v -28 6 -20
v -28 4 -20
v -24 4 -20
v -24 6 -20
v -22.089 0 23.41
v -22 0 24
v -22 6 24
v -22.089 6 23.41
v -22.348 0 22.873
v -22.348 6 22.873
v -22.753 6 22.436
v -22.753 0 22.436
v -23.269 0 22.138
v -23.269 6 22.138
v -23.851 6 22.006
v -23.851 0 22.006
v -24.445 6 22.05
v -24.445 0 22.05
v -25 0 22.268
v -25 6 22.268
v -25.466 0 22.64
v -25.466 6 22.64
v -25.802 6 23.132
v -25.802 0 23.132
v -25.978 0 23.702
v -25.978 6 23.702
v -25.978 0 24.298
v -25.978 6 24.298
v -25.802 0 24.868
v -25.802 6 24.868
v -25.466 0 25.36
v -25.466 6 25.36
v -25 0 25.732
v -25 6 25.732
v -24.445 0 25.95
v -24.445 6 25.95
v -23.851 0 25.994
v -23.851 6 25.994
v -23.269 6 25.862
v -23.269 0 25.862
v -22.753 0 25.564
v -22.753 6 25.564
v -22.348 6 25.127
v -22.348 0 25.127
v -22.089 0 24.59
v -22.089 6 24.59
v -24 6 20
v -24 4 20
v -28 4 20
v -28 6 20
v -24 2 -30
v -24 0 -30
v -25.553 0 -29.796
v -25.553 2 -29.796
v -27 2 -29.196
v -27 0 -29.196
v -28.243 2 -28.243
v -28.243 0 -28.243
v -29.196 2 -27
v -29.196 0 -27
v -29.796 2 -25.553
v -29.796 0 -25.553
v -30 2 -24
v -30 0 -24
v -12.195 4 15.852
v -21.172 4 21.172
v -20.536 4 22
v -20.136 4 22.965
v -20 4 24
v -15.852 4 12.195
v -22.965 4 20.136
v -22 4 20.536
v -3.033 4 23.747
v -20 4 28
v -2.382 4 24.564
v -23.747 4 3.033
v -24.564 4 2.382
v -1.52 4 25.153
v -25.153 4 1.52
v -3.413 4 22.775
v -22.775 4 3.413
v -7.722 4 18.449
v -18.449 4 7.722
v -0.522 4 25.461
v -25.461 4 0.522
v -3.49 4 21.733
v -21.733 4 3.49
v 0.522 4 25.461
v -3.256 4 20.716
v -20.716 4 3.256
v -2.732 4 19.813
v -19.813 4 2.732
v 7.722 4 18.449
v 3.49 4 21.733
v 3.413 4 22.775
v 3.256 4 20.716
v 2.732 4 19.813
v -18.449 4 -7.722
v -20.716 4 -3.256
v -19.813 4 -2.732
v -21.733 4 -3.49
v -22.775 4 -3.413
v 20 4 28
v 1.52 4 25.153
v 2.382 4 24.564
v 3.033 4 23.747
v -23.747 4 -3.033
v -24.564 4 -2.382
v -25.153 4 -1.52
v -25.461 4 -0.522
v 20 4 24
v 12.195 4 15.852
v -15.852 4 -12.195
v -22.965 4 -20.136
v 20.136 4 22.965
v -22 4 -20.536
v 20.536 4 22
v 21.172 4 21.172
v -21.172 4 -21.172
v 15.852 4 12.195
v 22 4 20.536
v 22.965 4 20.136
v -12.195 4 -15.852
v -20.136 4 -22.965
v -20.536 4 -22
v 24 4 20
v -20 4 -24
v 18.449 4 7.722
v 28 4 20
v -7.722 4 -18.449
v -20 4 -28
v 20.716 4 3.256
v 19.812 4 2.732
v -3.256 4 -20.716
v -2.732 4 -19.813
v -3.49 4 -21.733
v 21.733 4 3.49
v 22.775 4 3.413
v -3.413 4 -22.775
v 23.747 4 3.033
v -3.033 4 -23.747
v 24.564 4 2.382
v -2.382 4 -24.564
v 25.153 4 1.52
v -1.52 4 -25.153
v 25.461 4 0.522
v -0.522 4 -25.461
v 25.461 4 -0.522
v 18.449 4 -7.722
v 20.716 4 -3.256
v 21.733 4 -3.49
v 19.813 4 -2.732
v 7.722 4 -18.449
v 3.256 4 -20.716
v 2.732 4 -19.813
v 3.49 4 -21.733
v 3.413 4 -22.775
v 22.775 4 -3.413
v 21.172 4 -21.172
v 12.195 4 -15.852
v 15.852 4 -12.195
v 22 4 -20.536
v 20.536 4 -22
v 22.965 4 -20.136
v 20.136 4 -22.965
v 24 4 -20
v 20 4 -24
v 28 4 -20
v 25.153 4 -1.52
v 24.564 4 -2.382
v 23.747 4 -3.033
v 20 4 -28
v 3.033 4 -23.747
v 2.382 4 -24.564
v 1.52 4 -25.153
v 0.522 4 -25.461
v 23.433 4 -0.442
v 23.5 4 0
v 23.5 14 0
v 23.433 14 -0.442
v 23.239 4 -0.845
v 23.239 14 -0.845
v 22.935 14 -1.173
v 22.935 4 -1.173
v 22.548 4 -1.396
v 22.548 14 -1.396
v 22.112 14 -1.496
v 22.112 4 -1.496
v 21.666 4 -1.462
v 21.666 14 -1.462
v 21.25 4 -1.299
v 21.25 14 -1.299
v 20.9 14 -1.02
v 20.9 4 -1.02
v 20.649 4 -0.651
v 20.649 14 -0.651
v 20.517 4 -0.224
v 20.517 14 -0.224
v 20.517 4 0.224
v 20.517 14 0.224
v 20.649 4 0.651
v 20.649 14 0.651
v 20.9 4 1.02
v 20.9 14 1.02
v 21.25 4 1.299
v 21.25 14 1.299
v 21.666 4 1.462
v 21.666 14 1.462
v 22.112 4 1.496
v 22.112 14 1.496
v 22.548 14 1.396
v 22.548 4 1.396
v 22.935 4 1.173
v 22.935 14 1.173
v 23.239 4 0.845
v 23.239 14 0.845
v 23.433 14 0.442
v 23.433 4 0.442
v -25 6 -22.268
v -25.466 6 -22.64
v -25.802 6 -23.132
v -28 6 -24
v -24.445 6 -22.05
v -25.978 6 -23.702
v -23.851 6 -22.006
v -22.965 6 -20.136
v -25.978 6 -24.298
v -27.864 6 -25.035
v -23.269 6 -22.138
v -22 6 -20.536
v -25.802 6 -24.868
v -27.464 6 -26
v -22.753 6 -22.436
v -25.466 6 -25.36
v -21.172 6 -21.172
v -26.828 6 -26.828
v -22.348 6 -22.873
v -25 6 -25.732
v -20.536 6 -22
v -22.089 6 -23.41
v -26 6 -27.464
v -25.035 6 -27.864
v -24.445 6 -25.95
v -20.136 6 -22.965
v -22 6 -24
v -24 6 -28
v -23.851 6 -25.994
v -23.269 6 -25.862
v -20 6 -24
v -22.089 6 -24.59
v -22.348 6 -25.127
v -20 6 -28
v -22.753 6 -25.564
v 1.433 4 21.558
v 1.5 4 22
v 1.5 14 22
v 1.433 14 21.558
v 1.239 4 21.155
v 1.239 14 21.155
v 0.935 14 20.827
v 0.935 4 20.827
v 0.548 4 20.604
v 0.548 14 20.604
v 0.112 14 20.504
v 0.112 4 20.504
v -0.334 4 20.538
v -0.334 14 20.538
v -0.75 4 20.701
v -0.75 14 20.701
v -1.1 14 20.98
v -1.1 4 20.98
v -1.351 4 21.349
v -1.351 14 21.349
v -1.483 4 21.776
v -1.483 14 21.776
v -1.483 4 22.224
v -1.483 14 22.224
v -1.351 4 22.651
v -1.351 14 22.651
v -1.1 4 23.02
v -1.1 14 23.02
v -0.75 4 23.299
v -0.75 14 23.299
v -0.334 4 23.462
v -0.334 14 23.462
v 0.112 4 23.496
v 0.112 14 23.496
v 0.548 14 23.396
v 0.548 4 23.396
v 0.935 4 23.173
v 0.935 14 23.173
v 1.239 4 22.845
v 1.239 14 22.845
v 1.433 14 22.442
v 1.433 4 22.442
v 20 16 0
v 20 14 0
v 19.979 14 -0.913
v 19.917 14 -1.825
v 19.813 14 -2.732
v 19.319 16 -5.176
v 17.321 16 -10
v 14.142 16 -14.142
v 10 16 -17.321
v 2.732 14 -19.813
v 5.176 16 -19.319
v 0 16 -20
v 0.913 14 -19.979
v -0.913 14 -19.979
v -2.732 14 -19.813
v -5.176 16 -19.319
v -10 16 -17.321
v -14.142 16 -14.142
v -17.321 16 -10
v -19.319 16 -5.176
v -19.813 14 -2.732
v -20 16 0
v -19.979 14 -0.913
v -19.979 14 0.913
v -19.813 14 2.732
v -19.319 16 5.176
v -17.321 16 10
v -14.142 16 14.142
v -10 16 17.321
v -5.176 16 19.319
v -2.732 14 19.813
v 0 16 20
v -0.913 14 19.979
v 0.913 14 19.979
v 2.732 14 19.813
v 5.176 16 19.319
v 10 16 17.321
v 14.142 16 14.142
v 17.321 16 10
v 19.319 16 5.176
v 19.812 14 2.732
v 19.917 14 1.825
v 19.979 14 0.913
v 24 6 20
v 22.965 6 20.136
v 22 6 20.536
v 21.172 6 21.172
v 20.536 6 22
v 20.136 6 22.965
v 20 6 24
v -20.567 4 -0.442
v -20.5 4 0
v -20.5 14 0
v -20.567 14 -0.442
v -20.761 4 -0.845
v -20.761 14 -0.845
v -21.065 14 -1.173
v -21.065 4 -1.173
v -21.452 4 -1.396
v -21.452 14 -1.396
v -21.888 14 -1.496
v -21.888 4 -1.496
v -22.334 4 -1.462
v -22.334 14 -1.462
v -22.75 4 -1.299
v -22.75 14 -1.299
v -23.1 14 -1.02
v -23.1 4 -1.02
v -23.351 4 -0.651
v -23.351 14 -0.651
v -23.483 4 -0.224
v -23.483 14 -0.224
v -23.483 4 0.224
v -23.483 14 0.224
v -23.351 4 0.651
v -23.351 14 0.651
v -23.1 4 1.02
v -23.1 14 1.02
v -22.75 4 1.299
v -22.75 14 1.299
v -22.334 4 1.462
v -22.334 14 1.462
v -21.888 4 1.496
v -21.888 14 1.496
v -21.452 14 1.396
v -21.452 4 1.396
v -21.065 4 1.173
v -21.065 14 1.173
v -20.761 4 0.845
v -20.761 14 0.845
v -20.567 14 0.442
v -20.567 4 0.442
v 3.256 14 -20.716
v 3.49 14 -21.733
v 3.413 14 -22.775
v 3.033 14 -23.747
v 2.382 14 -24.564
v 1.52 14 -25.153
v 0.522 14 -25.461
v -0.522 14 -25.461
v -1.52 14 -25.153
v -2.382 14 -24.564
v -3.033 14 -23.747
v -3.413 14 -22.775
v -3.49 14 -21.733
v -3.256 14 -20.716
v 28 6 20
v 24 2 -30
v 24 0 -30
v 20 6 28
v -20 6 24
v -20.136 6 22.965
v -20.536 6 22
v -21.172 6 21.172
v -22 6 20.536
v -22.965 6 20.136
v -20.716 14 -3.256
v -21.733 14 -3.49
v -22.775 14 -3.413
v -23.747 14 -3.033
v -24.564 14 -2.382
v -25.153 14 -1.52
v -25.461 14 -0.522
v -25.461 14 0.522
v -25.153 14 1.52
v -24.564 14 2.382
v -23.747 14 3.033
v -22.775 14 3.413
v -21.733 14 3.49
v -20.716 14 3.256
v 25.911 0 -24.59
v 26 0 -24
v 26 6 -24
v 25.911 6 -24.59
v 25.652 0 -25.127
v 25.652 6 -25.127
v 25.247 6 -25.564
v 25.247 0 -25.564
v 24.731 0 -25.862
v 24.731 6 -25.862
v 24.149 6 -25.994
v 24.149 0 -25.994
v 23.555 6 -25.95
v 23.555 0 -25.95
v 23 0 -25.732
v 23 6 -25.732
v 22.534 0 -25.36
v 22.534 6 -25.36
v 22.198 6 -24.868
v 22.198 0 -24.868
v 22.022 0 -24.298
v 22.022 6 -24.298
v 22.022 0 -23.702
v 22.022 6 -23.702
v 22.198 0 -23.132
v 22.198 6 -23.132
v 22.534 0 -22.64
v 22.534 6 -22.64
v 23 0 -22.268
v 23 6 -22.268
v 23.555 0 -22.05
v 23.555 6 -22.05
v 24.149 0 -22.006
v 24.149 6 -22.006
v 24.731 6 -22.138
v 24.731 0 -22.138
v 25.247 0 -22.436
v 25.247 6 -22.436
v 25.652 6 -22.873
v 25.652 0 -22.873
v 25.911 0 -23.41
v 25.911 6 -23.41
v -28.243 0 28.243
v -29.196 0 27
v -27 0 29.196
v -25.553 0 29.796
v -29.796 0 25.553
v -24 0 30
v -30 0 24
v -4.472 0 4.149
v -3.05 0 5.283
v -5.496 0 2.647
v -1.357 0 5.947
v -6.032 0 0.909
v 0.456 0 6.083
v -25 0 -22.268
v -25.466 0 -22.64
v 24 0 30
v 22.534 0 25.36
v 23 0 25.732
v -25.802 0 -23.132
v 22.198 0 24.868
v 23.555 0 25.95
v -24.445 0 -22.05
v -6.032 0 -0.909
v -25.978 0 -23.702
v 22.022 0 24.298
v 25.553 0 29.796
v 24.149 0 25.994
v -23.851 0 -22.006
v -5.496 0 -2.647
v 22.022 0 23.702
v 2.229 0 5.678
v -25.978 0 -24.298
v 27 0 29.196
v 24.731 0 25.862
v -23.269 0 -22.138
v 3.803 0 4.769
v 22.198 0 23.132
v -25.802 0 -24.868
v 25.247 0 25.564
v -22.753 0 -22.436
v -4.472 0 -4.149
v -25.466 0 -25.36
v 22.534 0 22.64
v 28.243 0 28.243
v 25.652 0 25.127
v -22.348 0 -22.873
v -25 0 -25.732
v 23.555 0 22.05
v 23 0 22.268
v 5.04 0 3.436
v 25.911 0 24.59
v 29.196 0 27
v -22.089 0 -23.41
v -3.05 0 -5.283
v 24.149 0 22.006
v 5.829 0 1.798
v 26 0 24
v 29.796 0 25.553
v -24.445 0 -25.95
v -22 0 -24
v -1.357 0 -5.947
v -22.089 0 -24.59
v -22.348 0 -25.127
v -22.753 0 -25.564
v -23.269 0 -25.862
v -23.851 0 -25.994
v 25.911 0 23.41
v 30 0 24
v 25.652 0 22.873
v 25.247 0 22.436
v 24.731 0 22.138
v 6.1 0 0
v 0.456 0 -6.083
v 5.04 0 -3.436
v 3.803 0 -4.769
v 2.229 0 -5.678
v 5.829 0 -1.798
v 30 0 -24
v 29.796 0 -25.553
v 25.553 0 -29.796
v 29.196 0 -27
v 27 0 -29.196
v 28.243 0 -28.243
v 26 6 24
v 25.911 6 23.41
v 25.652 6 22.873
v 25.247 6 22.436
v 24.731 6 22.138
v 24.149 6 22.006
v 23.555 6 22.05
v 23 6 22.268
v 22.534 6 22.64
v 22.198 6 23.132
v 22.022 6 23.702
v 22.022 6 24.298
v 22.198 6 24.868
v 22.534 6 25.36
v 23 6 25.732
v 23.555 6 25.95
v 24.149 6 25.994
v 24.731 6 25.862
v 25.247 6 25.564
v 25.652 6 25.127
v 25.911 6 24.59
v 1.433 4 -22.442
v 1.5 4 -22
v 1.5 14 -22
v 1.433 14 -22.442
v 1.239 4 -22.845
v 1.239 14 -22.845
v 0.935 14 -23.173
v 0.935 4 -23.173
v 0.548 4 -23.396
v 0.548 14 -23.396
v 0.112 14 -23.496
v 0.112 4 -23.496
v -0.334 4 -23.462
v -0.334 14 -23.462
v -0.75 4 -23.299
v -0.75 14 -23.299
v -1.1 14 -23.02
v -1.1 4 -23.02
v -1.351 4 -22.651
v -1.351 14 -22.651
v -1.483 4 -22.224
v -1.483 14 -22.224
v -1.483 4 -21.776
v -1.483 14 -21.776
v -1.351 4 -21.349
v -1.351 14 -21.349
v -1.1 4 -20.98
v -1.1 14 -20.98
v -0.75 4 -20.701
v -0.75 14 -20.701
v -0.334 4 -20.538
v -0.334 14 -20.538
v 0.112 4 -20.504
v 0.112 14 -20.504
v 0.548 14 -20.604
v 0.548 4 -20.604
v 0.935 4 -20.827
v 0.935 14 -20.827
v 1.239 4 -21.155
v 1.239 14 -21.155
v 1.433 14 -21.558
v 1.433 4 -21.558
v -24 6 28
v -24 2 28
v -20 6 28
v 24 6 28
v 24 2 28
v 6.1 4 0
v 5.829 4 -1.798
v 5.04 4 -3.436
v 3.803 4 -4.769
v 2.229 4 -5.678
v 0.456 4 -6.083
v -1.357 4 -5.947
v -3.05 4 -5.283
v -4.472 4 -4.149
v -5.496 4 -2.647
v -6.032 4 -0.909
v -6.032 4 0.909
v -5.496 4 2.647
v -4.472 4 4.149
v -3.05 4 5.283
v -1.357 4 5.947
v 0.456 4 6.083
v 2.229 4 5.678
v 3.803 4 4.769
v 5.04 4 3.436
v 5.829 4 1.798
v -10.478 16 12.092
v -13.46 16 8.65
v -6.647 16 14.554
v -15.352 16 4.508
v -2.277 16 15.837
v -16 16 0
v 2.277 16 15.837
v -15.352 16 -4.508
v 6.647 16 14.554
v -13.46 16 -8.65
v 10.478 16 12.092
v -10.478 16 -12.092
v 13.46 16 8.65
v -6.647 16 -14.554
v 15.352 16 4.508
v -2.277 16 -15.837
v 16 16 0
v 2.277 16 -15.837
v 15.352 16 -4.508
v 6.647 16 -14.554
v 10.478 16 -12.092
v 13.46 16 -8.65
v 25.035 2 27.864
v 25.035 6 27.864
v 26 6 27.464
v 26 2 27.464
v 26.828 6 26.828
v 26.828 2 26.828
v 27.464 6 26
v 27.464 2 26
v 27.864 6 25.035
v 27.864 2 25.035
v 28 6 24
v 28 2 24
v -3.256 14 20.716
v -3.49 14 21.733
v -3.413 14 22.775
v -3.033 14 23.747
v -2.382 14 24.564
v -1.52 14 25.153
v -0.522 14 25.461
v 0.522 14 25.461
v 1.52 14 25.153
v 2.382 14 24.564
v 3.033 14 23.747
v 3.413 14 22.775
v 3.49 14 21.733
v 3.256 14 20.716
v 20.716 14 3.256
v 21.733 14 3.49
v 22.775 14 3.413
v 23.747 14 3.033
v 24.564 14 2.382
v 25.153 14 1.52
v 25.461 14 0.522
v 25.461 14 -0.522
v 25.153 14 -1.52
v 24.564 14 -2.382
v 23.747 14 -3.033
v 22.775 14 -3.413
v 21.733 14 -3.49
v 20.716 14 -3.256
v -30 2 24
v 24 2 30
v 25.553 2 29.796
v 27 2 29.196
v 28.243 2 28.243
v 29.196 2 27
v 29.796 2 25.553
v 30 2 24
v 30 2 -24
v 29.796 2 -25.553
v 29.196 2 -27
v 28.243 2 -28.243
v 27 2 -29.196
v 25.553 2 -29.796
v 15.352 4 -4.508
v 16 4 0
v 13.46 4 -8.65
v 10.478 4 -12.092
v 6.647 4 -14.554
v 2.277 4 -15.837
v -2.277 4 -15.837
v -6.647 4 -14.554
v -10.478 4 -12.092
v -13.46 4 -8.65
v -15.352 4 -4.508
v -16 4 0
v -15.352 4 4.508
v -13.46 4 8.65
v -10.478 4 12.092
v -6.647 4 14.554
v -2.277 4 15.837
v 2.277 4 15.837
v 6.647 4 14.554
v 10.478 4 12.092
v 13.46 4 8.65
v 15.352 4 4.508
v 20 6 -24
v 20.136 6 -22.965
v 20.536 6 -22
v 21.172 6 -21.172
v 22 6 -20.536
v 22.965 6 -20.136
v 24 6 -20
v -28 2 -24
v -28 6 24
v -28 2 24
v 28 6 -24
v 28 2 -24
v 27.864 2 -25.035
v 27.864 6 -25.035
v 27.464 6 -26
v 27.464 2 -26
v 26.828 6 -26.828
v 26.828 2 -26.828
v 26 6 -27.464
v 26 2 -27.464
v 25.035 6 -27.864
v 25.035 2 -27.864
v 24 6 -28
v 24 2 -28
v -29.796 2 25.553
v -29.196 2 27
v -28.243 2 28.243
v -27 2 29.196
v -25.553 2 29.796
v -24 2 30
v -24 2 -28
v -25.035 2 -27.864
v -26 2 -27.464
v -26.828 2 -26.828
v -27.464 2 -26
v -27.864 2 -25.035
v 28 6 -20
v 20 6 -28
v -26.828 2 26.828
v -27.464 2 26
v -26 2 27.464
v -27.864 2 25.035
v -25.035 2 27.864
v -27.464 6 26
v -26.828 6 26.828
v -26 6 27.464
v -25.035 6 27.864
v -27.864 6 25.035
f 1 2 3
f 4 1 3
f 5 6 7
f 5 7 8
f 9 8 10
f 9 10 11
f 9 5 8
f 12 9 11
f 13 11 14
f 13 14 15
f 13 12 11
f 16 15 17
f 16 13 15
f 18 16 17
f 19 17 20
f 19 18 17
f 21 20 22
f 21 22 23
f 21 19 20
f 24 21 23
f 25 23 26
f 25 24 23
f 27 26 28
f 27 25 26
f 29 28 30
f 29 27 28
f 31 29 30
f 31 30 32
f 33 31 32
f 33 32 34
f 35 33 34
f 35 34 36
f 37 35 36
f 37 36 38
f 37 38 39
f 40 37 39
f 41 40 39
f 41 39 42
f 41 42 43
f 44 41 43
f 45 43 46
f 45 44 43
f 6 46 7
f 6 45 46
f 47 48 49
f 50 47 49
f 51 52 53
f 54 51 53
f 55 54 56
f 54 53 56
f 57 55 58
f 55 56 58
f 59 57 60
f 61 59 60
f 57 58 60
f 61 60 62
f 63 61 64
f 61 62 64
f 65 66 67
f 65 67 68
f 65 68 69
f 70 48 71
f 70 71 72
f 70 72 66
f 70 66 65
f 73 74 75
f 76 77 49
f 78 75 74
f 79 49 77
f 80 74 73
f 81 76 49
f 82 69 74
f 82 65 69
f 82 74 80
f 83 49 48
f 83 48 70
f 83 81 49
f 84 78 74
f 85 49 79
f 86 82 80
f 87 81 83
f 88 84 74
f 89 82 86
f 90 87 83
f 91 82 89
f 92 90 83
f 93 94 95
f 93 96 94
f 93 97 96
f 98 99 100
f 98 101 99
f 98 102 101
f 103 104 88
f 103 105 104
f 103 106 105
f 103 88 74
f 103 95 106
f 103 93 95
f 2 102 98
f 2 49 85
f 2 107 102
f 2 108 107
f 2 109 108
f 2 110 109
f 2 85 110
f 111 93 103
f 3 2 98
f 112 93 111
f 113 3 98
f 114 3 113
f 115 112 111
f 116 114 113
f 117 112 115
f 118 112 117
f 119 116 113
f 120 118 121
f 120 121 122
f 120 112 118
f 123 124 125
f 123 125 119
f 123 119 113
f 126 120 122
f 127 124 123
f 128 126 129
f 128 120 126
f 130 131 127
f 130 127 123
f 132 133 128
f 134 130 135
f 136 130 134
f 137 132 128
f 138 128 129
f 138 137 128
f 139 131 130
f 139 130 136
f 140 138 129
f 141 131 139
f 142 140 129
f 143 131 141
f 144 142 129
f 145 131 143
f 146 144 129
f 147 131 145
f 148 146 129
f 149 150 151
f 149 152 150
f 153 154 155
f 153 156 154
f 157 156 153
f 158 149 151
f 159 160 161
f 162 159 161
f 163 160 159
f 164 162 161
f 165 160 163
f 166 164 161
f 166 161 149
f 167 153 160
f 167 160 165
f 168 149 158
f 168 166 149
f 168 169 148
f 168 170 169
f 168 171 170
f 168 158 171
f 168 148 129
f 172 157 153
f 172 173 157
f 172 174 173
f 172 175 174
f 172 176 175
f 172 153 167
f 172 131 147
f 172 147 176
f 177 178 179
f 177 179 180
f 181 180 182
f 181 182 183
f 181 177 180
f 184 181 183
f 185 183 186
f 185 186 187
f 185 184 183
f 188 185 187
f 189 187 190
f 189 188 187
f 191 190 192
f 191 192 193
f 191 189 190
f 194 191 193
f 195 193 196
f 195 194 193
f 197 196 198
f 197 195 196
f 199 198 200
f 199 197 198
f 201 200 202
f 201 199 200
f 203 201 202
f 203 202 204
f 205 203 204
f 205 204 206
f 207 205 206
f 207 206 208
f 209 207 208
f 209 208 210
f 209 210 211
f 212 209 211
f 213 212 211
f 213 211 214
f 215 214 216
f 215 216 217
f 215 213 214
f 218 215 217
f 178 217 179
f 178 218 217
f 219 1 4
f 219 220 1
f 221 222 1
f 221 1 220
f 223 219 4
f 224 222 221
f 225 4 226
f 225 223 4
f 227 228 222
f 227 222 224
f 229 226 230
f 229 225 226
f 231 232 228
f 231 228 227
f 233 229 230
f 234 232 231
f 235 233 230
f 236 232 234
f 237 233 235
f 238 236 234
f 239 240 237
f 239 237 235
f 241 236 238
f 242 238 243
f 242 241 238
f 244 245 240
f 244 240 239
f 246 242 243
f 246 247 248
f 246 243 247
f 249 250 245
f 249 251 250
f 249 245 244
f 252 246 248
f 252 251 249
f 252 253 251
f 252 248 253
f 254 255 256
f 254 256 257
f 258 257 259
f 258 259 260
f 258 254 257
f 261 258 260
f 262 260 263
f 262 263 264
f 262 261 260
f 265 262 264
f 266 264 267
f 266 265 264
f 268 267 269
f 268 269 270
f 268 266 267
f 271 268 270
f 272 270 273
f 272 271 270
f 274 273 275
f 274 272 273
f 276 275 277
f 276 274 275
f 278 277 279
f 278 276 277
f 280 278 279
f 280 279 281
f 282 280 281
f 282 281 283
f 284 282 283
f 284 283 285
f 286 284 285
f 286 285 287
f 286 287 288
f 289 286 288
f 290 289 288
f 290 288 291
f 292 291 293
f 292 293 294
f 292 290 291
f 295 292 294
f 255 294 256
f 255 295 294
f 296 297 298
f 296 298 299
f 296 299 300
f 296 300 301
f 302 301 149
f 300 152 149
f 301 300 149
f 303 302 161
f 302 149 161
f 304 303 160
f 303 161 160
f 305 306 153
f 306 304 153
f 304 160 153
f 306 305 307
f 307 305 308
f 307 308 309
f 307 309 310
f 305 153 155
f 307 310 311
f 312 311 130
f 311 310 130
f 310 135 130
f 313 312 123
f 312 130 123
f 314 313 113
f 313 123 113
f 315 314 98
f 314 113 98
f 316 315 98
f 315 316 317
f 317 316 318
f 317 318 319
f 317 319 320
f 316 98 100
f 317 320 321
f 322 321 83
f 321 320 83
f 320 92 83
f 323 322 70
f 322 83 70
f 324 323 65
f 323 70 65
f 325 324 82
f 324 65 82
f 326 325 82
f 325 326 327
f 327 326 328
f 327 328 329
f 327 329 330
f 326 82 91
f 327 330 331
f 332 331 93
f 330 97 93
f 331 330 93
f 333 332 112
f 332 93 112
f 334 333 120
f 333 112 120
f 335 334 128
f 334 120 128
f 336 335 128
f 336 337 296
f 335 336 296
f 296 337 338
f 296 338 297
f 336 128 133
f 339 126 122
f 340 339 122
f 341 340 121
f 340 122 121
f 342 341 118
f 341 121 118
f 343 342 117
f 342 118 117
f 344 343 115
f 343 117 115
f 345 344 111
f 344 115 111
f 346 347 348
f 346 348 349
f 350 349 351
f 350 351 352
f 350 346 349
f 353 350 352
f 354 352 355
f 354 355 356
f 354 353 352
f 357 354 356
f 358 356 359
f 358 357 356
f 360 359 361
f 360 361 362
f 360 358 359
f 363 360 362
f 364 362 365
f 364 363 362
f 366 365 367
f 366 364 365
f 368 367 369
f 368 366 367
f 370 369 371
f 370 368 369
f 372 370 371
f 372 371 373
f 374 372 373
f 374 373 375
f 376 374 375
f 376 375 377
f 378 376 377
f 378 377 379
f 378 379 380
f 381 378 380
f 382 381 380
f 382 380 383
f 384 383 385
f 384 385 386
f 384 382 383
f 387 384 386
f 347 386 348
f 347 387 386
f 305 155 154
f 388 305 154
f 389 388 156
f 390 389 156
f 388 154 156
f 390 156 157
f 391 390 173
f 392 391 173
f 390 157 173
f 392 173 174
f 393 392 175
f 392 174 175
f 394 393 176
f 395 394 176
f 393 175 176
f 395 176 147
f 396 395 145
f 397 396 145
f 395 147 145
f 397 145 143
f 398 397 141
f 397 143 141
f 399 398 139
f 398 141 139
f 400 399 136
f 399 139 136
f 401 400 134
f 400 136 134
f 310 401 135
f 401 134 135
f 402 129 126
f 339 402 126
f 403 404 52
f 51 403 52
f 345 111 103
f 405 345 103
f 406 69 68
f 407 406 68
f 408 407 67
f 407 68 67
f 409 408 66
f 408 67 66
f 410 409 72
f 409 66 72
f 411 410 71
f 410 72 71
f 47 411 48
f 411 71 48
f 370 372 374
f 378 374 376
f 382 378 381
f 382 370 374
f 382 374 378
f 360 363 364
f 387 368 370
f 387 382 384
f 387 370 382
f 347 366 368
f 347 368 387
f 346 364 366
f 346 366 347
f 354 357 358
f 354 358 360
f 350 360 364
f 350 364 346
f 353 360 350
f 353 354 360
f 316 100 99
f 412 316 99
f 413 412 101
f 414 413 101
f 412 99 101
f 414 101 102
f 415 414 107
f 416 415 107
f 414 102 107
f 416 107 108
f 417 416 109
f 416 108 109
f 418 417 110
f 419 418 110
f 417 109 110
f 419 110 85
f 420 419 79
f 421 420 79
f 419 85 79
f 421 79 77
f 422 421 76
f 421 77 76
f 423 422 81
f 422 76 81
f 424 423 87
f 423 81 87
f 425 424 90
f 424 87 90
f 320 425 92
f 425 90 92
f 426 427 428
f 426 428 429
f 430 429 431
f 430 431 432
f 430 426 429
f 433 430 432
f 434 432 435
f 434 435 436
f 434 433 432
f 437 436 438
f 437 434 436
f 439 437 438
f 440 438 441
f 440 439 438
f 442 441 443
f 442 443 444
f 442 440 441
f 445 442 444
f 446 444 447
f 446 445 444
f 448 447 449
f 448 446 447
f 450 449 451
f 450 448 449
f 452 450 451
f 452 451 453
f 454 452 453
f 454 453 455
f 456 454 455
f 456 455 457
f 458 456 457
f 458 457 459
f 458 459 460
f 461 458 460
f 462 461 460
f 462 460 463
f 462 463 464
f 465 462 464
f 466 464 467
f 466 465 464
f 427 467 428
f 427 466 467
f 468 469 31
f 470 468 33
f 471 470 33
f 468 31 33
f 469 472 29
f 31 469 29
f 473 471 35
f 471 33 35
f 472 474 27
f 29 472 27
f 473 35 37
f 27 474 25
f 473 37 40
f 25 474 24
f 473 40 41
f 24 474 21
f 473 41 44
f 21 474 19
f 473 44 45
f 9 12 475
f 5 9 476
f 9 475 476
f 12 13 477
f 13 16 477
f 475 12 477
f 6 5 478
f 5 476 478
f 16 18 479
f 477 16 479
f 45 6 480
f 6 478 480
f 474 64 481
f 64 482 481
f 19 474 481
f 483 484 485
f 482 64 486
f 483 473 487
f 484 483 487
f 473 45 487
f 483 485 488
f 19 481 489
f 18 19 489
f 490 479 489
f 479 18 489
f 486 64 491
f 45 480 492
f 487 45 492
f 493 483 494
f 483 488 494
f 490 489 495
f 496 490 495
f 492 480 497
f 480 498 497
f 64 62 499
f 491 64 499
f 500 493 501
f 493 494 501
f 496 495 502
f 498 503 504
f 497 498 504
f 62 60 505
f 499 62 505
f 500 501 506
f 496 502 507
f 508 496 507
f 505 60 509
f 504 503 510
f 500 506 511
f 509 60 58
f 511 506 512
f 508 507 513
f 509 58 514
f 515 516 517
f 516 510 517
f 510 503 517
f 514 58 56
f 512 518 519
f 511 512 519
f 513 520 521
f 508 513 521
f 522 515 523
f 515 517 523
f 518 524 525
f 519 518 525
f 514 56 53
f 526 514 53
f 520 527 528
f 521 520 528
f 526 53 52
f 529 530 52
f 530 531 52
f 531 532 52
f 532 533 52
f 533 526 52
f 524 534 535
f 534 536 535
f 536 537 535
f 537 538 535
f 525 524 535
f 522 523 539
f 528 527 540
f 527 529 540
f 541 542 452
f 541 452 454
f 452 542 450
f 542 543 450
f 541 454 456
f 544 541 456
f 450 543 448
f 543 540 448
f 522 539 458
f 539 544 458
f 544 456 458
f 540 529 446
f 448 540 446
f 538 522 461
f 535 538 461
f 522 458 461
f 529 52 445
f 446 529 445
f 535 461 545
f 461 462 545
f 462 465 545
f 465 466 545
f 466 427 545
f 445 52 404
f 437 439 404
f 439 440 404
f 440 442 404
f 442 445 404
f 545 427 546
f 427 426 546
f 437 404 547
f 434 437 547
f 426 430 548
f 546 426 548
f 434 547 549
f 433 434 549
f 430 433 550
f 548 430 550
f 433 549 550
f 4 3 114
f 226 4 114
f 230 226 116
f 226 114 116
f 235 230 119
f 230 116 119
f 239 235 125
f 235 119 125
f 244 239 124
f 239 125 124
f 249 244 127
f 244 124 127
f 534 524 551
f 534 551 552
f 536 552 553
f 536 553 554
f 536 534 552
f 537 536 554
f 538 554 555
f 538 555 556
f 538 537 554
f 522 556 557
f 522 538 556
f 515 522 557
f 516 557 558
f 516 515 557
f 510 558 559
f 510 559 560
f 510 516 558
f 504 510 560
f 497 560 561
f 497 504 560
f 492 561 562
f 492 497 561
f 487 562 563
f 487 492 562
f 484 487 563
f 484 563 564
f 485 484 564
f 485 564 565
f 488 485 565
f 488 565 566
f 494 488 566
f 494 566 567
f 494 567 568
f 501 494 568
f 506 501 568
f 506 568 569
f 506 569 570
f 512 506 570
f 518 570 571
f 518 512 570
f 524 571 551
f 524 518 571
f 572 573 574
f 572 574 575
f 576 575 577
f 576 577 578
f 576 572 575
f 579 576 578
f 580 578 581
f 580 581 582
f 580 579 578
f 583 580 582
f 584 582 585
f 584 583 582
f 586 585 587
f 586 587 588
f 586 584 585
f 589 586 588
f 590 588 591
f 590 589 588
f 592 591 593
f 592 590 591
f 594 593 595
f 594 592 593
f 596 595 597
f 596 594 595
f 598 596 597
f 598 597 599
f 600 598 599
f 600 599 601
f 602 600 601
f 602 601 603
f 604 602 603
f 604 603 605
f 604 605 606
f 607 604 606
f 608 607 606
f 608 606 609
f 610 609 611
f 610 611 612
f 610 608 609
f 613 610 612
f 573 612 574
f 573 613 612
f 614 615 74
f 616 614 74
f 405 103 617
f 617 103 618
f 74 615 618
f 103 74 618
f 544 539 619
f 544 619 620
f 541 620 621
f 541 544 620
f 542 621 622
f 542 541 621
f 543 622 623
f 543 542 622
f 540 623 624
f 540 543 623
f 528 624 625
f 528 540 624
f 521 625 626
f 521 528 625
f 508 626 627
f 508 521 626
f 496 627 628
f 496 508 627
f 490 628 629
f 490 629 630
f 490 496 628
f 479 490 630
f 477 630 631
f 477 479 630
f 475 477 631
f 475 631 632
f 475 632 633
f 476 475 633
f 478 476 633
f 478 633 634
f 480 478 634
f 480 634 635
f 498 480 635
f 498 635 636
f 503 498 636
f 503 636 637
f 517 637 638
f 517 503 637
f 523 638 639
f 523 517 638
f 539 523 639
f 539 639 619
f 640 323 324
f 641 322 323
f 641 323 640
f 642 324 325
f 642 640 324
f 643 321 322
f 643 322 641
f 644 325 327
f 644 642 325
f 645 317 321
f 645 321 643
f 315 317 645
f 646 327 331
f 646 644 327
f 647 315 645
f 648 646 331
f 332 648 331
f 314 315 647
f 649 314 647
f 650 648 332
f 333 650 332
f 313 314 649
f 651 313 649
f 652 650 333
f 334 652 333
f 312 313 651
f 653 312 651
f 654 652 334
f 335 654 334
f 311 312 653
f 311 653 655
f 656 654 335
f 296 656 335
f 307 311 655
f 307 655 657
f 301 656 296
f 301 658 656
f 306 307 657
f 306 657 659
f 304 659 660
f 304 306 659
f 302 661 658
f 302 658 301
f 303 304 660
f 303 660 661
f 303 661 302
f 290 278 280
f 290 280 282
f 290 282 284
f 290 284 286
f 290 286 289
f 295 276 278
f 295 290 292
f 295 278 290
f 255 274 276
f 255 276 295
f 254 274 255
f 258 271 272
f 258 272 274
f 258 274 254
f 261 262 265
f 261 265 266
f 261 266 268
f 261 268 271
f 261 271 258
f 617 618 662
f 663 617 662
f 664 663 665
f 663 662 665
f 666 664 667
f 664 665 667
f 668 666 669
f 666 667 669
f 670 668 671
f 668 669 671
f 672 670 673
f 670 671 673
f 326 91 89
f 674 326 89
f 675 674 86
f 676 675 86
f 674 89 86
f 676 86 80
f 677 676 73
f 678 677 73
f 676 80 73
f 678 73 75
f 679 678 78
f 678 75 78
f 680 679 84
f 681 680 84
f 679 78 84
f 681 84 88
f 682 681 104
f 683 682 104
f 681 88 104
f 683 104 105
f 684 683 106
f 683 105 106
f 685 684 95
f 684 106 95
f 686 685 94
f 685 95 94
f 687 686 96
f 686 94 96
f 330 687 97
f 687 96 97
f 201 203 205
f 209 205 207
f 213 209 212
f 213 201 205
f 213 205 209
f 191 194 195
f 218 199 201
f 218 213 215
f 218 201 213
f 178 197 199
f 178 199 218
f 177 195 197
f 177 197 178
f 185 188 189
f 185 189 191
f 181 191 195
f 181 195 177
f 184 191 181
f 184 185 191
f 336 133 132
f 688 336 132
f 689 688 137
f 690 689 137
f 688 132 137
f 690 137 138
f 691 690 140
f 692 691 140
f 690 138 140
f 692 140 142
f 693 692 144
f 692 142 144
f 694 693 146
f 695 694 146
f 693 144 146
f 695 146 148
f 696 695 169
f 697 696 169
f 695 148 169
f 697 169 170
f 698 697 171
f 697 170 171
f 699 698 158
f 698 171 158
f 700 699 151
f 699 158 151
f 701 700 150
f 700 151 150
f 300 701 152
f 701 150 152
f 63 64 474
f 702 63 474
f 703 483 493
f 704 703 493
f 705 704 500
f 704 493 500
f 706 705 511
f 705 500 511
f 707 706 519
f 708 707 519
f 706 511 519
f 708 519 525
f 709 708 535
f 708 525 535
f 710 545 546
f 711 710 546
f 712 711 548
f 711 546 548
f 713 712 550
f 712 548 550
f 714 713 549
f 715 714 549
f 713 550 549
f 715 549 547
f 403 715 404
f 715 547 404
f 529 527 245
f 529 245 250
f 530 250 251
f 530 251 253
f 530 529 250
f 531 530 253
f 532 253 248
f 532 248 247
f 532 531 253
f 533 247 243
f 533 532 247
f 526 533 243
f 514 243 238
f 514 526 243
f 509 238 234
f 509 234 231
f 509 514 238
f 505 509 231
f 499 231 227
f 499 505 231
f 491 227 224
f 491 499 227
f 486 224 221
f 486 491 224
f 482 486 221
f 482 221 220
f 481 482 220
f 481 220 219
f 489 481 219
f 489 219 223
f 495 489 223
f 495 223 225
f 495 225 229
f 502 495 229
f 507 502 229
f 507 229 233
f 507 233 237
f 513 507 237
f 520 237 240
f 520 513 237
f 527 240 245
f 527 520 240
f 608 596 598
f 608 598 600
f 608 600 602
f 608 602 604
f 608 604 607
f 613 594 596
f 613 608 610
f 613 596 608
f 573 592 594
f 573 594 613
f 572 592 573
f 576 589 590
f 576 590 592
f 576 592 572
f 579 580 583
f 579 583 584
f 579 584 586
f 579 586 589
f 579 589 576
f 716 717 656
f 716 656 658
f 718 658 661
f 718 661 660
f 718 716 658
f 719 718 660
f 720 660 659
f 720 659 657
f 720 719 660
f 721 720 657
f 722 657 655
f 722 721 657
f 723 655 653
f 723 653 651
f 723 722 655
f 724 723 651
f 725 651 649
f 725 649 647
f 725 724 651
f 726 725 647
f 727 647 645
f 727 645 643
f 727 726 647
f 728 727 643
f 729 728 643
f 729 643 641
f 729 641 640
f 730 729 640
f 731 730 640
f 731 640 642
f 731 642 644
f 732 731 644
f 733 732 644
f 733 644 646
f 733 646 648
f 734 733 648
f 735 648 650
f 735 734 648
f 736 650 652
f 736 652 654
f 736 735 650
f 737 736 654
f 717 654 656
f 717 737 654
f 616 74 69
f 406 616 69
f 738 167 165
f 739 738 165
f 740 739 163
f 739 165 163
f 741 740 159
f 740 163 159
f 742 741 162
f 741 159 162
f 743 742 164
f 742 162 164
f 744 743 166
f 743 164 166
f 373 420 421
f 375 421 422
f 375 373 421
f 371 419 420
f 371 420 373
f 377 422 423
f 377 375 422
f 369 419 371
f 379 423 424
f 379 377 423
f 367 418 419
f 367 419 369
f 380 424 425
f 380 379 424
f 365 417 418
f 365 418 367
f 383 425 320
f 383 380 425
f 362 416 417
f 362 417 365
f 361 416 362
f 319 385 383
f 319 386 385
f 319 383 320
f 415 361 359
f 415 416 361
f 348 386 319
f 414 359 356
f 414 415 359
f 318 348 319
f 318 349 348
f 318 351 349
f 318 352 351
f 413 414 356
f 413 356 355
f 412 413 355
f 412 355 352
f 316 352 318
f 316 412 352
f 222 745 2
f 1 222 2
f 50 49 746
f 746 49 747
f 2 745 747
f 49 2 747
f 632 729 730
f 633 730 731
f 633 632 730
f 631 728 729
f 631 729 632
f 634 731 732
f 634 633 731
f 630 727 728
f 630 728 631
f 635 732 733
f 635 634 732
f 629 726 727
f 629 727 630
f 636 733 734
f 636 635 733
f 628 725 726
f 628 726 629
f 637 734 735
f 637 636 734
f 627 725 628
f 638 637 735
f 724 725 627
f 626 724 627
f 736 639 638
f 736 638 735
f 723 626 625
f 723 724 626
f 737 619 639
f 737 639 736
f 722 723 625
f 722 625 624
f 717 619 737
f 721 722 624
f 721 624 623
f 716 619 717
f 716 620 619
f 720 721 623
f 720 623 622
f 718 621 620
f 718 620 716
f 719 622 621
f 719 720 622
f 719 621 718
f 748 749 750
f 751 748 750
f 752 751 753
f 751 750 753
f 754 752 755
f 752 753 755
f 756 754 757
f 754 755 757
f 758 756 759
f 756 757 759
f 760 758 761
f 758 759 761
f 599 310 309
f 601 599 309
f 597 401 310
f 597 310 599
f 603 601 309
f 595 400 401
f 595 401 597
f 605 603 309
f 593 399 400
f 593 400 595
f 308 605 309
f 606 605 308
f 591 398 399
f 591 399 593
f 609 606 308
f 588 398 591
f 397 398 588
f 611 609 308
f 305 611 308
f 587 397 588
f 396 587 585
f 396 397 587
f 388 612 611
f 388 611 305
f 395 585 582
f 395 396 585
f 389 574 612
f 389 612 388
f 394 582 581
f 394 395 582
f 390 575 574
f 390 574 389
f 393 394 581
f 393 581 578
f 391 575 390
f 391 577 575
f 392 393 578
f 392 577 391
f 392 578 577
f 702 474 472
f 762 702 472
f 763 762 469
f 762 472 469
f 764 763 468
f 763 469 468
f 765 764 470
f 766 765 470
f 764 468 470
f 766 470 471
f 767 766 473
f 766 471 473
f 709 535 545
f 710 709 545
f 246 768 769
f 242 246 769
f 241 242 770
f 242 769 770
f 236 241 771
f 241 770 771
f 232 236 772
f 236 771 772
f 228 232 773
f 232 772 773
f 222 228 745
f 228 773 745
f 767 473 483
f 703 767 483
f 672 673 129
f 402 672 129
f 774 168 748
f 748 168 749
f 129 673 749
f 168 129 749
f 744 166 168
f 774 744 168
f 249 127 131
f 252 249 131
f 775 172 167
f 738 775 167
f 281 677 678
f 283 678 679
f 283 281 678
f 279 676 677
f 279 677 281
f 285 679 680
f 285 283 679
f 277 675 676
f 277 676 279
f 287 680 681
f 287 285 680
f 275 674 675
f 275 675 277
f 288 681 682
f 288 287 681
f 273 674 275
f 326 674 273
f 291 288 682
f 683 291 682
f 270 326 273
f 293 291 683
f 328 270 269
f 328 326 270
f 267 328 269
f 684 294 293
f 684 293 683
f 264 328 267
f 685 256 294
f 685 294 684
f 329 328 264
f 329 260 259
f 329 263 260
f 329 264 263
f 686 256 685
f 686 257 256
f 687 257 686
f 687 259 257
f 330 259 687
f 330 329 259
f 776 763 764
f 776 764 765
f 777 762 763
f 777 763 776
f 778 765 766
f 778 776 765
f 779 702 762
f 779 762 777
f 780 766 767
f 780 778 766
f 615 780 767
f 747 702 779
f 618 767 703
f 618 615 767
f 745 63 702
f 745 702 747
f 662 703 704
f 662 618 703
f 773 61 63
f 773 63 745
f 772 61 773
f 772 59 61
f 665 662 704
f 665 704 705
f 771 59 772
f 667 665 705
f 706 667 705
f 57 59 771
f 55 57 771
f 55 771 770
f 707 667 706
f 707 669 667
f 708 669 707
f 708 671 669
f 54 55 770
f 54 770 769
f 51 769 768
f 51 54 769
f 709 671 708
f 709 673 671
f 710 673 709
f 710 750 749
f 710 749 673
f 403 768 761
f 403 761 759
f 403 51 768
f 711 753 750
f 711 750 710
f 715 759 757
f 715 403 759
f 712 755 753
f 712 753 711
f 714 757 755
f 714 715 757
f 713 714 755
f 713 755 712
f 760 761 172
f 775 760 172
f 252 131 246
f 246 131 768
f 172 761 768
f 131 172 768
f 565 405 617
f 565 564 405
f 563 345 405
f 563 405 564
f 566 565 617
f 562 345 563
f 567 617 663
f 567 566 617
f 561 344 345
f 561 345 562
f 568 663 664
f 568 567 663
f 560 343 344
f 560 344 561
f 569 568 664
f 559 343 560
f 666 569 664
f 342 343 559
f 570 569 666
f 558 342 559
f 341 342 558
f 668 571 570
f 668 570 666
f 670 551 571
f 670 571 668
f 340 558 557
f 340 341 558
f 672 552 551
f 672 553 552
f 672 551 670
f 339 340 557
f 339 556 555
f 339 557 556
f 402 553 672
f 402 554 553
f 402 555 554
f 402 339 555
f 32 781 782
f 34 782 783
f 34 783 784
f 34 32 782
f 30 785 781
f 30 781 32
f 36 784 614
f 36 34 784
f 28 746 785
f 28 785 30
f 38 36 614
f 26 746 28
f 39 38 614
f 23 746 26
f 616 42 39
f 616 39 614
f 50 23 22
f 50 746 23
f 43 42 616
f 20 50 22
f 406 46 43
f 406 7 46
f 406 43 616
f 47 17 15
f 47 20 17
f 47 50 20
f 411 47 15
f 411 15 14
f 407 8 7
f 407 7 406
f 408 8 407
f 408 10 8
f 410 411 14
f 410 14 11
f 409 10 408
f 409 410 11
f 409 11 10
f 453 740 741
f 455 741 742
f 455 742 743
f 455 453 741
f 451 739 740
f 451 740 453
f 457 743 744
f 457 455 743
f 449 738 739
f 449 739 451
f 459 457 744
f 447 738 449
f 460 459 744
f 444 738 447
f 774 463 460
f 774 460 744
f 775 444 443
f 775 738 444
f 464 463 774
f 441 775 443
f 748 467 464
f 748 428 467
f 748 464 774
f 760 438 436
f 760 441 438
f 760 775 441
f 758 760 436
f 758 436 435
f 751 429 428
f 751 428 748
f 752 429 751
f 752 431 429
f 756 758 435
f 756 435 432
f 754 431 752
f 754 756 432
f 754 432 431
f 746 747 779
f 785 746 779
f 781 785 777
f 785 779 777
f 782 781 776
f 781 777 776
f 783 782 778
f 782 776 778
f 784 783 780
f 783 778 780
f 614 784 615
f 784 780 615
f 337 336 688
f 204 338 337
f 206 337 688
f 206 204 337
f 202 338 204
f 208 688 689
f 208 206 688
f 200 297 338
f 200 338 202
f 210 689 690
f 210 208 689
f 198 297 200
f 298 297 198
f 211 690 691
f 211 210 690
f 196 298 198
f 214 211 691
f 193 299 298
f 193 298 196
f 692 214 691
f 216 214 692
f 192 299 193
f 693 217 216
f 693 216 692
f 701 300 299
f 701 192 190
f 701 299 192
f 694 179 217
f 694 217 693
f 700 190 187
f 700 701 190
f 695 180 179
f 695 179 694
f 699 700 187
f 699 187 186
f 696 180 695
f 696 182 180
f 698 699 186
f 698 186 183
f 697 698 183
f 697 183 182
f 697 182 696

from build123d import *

# Parameters (mm, degrees)
SKETCH1_R           = 6.1
BOSS_EXTRUDE1_DEPTH = 4
BOSS_EXTRUDE2_START = 4
SKETCH1_3_R         = 20
SKETCH1_3_R_2       = 16
BOSS_EXTRUDE2_DEPTH = 12
BOSS_EXTRUDE3_DEPTH = 2
SKETCH1_5_R         = 2
BOSS_EXTRUDE4_DEPTH = 6
BOSS_EXTRUDE5_START = 4
SKETCH1_6_R         = 1.5
BOSS_EXTRUDE5_DEPTH = 10


with BuildPart() as part:
    # Sketch1 → Boss-Extrude1 (new body)
    with BuildSketch(Plane(origin=(0, 0, 0), x_dir=(1, 0, 0), z_dir=(0, 1, 0))):
        with BuildLine():
            Line((-24, 20), (-28, 20))
            Line((-28, 20), (-28, -20))
            Line((-28, -20), (-24, -20))
            ThreePointArc((-24, -20), (-21.171572875, -21.171572875), (-20, -24))
            Line((-20, -24), (-20, -28))
            Line((-20, -28), (20, -28))
            Line((20, -28), (20, -24))
            ThreePointArc((20, -24), (21.171572875, -21.171572875), (24, -20))
            Line((24, -20), (28, -20))
            Line((28, -20), (28, 20))
            Line((28, 20), (24, 20))
            ThreePointArc((24, 20), (21.171572875, 21.171572875), (20, 24))
            Line((20, 24), (20, 28))
            Line((20, 28), (-20, 28))
            Line((-20, 28), (-20, 24))
            ThreePointArc((-20, 24), (-21.171572875, 21.171572875), (-24, 20))
        make_face()
        Circle(SKETCH1_R, mode=Mode.SUBTRACT)
    extrude(amount=BOSS_EXTRUDE1_DEPTH)

    # Sketch1_3 → Boss-Extrude2 (add)
    with BuildSketch(Plane(origin=(0, 0, 0), x_dir=(1, 0, 0), z_dir=(0, 1, 0)).offset(BOSS_EXTRUDE2_START)):
        Circle(SKETCH1_3_R)
        Circle(SKETCH1_3_R_2, mode=Mode.SUBTRACT)
    extrude(amount=BOSS_EXTRUDE2_DEPTH)

    # Sketch1_4 → Boss-Extrude3 (add)
    with BuildSketch(Plane(origin=(0, 0, 0), x_dir=(1, 0, 0), z_dir=(0, 1, 0))):
        with BuildLine():
            Line((24, 30), (-24, 30))
            ThreePointArc((-24, 30), (-28.242640687, 28.242640687), (-30, 24))
            Line((-30, 24), (-30, -24))
            ThreePointArc((-30, -24), (-28.242640687, -28.242640687), (-24, -30))
            Line((-24, -30), (24, -30))
            ThreePointArc((24, -30), (28.242640687, -28.242640687), (30, -24))
            Line((30, -24), (30, 24))
            ThreePointArc((30, 24), (28.242640687, 28.242640687), (24, 30))
        make_face()
        with BuildLine():
            Line((-28, 20), (-28, 24))
            ThreePointArc((-28, 24), (-26.828427125, 26.828427125), (-24, 28))
            Line((-24, 28), (-20, 28))
            Line((-20, 28), (20, 28))
            Line((20, 28), (24, 28))
            ThreePointArc((24, 28), (26.828427125, 26.828427125), (28, 24))
            Line((28, 24), (28, 20))
            Line((28, 20), (28, -20))
            Line((28, -20), (28, -24))
            ThreePointArc((28, -24), (26.828427125, -26.828427125), (24, -28))
            Line((24, -28), (20, -28))
            Line((20, -28), (-20, -28))
            Line((-20, -28), (-24, -28))
            ThreePointArc((-24, -28), (-26.828427125, -26.828427125), (-28, -24))
            Line((-28, -24), (-28, -20))
            Line((-28, -20), (-28, 20))
        make_face(mode=Mode.SUBTRACT)
    extrude(amount=BOSS_EXTRUDE3_DEPTH)

    # Sketch1_5 → Boss-Extrude4 (add)
    with BuildSketch(Plane(origin=(0, 0, 0), x_dir=(1, 0, 0), z_dir=(0, 1, 0))):
        with BuildLine():
            Line((-24, -20), (-28, -20))
            Line((-28, -20), (-28, -24))
            ThreePointArc((-28, -24), (-26.828427125, -26.828427125), (-24, -28))
            Line((-24, -28), (-20, -28))
            Line((-20, -28), (-20, -24))
            ThreePointArc((-20, -24), (-21.171572875, -21.171572875), (-24, -20))
        make_face()
        with Locations((-24, -24)):
            Circle(SKETCH1_5_R, mode=Mode.SUBTRACT)
        with BuildLine():
            Line((20, -24), (20, -28))
            Line((20, -28), (24, -28))
            ThreePointArc((24, -28), (26.828427125, -26.828427125), (28, -24))
            Line((28, -24), (28, -20))
            Line((28, -20), (24, -20))
            ThreePointArc((24, -20), (21.171572875, -21.171572875), (20, -24))
        make_face()
        with Locations((24, -24)):
            Circle(SKETCH1_5_R, mode=Mode.SUBTRACT)
        with BuildLine():
            Line((24, 28), (20, 28))
            Line((20, 28), (20, 24))
            ThreePointArc((20, 24), (21.171572875, 21.171572875), (24, 20))
            Line((24, 20), (28, 20))
            Line((28, 20), (28, 24))
            ThreePointArc((28, 24), (26.828427125, 26.828427125), (24, 28))
        make_face()
        with Locations((24, 24)):
            Circle(SKETCH1_5_R, mode=Mode.SUBTRACT)
        with BuildLine():
            ThreePointArc((-24, 28), (-26.828427125, 26.828427125), (-28, 24))
            Line((-28, 24), (-28, 20))
            Line((-28, 20), (-24, 20))
            ThreePointArc((-24, 20), (-21.171572875, 21.171572875), (-20, 24))
            Line((-20, 24), (-20, 28))
            Line((-20, 28), (-24, 28))
        make_face()
        with Locations((-24, 24)):
            Circle(SKETCH1_5_R, mode=Mode.SUBTRACT)
    extrude(amount=BOSS_EXTRUDE4_DEPTH)

    # Sketch1_6 → Boss-Extrude5 (add)
    with BuildSketch(Plane(origin=(0, 0, 0), x_dir=(1, 0, 0), z_dir=(0, 1, 0)).offset(BOSS_EXTRUDE5_START)):
        with BuildLine():
            ThreePointArc((-2.732186624, -19.8125), (0, -25.5), (2.732186624, -19.8125))
            ThreePointArc((2.732186624, -19.8125), (0, -20), (-2.732186624, -19.8125))
        make_face()
        with Locations((0, -22)):
            Circle(SKETCH1_6_R, mode=Mode.SUBTRACT)
        with BuildLine():
            ThreePointArc((-19.8125, -2.732186624), (-20, 0), (-19.8125, 2.732186624))
            ThreePointArc((-19.8125, 2.732186624), (-25.5, 0), (-19.8125, -2.732186624))
        make_face()
        with Locations((-22, 0)):
            Circle(SKETCH1_6_R, mode=Mode.SUBTRACT)
        with BuildLine():
            ThreePointArc((-2.732186624, 19.8125), (0, 20), (2.732186624, 19.8125))
            ThreePointArc((2.732186624, 19.8125), (0, 25.5), (-2.732186624, 19.8125))
        make_face()
        with Locations((0, 22)):
            Circle(SKETCH1_6_R, mode=Mode.SUBTRACT)
        with BuildLine():
            ThreePointArc((19.8125, 2.732186624), (19.953069939, 1.369306394), (20, 0))
            ThreePointArc((20, 0), (19.953069939, -1.369306394), (19.8125, -2.732186624))
            ThreePointArc((19.8125, -2.732186624), (25.5, 0), (19.8125, 2.732186624))
        make_face()
        with Locations((22, 0)):
            Circle(SKETCH1_6_R, mode=Mode.SUBTRACT)
    extrude(amount=BOSS_EXTRUDE5_DEPTH)


solid = part.part
